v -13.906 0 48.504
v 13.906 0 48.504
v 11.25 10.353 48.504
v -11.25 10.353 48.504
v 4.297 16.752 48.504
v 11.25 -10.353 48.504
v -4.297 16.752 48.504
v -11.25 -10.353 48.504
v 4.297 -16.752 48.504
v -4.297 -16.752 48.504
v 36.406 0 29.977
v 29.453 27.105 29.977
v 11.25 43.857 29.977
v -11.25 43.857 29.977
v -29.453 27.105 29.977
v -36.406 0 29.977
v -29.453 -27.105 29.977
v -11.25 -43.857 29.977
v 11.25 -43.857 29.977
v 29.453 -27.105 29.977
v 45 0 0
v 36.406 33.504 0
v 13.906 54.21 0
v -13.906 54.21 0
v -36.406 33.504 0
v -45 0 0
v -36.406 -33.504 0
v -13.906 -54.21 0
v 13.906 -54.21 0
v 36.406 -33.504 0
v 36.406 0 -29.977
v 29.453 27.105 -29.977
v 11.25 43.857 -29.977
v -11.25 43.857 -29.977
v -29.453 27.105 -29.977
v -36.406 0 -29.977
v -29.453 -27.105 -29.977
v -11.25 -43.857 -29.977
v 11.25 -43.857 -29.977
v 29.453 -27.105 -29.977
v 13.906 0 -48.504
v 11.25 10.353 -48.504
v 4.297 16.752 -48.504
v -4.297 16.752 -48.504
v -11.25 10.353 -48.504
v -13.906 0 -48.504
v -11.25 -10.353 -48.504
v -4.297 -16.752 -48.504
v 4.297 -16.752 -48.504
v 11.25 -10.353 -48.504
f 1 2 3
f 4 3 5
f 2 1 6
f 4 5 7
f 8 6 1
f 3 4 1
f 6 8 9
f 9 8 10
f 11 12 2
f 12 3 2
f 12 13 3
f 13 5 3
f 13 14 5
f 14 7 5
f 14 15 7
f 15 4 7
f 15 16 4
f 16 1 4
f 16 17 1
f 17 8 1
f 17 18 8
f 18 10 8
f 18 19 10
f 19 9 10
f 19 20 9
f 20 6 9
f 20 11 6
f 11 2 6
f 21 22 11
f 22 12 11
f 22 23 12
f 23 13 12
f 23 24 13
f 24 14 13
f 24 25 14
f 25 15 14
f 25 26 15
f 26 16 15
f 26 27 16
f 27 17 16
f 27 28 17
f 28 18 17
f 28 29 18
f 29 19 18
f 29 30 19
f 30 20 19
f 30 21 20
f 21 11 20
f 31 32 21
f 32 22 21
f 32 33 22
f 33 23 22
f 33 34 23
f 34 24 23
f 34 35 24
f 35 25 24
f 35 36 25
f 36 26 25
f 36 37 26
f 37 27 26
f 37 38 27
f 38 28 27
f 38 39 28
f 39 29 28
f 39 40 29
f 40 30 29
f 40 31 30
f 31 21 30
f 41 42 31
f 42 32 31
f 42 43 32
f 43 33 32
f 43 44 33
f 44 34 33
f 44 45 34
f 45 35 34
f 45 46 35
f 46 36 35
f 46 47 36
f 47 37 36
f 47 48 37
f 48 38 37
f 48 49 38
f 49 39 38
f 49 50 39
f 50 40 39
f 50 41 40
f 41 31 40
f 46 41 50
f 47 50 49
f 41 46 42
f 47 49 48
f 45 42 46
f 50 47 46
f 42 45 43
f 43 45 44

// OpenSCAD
// Generated by SolidPython 1.0.1 on 2020-07-29 00:46:52


scale(v = [15, 19, 17]) {
	sphere(r = 3);
}
/***********************************************
*********      SolidPython code:      **********
************************************************
 
# import packages: SolidPython
from solid import *
from solid.utils import *
from itertools import chain, combinations, permutations


class Resize:

    def __init__(self, scad_file):
        self.scad_file = scad_file
        #self.scad_file = import_scad(scad_file)
        # cone/cylinder param:
        self.r1 = 0
        self.r2 = 0
        self.h = 0
        # rectangular prism param:
        self.w = 0
        self.l = 0
        # ellipse param:
        self.r = 0

    # import OpenScad code (file name corresponds to shape)


    # classify shape + parameters
    def assign(self, param1, param2, param3):
        if self.scad_file == 'cone.scad':
            self.r1 = param1
            self.r2 = param2
            self.h = param3
        elif self.scad_file == 'cylinder.scad':
            self.r1 = param1
            self.r2 = param2
            self.h = param3
        elif self.scad_file == 'rectangularPrism.scad':
            self.h = param1
            self.l = param2
            self.w = param3
        else:
            self.r = param1
            self.h = param2

    # resize parameters
    def iterate(self):
        x = range(3, 20, 2)
        i = 1
        if self.scad_file == 'cone.scad':
            tempList = list(permutations(x, 2))
            for temp in tempList:
                param1 = temp[0]
                param2 = temp[1]
                filepath = 'produced_scad_files/' + 'cone' + str(param1) + '_' + str(param2) + '_' + '.scad'
                scad_render_to_file(cylinder(h=param1, r1=param2, r2=0), filepath)

        elif self.scad_file == 'cylinder.scad':
            tempList = list(permutations(x, 3))
            for temp in tempList:
                param1 = temp[0]
                param2 = temp[1]
                filepath = 'produced_scad_files/' + 'cylinder' + str(param1) + '_' + str(param2) + '_' + '.scad'
                scad_render_to_file(cylinder(h=param1, r1=param2, r2=param2), filepath)

        elif self.scad_file == 'rectangularPrism.scad':
            tempList = list(permutations(x, 3))
            for temp in tempList:
                param1 = temp[0]
                param2 = temp[1]
                param3 = temp[2]
                filepath = 'produced_scad_files/' + 'rectangularPrism' + str(param1) + '_' + str(param2) + '_' + str(
                    param3) + '.scad'
                scad_render_to_file(cube(size=(param1, param2, param3)), filepath)

        elif self.scad_file == 'ellipse.scad':
            tempList = list(permutations(x, 4))
            for temp in tempList:
                param1 = temp[0]
                param2 = temp[1]
                param3 = temp[2]
                param4 = temp[3]
                filepath = 'produced_scad_files/' + 'ellipse' + str(param1) + '_' + str(param2) + '_' + str(param3) + '_' + str(param4) + '.scad'
                scad_render_to_file(scale([param1, param2, param3])(sphere(r=param4)), filepath)

    def render_to_scadfile(self):
        scad_render_to_file(scad, 'example.scad') 
 
************************************************/
